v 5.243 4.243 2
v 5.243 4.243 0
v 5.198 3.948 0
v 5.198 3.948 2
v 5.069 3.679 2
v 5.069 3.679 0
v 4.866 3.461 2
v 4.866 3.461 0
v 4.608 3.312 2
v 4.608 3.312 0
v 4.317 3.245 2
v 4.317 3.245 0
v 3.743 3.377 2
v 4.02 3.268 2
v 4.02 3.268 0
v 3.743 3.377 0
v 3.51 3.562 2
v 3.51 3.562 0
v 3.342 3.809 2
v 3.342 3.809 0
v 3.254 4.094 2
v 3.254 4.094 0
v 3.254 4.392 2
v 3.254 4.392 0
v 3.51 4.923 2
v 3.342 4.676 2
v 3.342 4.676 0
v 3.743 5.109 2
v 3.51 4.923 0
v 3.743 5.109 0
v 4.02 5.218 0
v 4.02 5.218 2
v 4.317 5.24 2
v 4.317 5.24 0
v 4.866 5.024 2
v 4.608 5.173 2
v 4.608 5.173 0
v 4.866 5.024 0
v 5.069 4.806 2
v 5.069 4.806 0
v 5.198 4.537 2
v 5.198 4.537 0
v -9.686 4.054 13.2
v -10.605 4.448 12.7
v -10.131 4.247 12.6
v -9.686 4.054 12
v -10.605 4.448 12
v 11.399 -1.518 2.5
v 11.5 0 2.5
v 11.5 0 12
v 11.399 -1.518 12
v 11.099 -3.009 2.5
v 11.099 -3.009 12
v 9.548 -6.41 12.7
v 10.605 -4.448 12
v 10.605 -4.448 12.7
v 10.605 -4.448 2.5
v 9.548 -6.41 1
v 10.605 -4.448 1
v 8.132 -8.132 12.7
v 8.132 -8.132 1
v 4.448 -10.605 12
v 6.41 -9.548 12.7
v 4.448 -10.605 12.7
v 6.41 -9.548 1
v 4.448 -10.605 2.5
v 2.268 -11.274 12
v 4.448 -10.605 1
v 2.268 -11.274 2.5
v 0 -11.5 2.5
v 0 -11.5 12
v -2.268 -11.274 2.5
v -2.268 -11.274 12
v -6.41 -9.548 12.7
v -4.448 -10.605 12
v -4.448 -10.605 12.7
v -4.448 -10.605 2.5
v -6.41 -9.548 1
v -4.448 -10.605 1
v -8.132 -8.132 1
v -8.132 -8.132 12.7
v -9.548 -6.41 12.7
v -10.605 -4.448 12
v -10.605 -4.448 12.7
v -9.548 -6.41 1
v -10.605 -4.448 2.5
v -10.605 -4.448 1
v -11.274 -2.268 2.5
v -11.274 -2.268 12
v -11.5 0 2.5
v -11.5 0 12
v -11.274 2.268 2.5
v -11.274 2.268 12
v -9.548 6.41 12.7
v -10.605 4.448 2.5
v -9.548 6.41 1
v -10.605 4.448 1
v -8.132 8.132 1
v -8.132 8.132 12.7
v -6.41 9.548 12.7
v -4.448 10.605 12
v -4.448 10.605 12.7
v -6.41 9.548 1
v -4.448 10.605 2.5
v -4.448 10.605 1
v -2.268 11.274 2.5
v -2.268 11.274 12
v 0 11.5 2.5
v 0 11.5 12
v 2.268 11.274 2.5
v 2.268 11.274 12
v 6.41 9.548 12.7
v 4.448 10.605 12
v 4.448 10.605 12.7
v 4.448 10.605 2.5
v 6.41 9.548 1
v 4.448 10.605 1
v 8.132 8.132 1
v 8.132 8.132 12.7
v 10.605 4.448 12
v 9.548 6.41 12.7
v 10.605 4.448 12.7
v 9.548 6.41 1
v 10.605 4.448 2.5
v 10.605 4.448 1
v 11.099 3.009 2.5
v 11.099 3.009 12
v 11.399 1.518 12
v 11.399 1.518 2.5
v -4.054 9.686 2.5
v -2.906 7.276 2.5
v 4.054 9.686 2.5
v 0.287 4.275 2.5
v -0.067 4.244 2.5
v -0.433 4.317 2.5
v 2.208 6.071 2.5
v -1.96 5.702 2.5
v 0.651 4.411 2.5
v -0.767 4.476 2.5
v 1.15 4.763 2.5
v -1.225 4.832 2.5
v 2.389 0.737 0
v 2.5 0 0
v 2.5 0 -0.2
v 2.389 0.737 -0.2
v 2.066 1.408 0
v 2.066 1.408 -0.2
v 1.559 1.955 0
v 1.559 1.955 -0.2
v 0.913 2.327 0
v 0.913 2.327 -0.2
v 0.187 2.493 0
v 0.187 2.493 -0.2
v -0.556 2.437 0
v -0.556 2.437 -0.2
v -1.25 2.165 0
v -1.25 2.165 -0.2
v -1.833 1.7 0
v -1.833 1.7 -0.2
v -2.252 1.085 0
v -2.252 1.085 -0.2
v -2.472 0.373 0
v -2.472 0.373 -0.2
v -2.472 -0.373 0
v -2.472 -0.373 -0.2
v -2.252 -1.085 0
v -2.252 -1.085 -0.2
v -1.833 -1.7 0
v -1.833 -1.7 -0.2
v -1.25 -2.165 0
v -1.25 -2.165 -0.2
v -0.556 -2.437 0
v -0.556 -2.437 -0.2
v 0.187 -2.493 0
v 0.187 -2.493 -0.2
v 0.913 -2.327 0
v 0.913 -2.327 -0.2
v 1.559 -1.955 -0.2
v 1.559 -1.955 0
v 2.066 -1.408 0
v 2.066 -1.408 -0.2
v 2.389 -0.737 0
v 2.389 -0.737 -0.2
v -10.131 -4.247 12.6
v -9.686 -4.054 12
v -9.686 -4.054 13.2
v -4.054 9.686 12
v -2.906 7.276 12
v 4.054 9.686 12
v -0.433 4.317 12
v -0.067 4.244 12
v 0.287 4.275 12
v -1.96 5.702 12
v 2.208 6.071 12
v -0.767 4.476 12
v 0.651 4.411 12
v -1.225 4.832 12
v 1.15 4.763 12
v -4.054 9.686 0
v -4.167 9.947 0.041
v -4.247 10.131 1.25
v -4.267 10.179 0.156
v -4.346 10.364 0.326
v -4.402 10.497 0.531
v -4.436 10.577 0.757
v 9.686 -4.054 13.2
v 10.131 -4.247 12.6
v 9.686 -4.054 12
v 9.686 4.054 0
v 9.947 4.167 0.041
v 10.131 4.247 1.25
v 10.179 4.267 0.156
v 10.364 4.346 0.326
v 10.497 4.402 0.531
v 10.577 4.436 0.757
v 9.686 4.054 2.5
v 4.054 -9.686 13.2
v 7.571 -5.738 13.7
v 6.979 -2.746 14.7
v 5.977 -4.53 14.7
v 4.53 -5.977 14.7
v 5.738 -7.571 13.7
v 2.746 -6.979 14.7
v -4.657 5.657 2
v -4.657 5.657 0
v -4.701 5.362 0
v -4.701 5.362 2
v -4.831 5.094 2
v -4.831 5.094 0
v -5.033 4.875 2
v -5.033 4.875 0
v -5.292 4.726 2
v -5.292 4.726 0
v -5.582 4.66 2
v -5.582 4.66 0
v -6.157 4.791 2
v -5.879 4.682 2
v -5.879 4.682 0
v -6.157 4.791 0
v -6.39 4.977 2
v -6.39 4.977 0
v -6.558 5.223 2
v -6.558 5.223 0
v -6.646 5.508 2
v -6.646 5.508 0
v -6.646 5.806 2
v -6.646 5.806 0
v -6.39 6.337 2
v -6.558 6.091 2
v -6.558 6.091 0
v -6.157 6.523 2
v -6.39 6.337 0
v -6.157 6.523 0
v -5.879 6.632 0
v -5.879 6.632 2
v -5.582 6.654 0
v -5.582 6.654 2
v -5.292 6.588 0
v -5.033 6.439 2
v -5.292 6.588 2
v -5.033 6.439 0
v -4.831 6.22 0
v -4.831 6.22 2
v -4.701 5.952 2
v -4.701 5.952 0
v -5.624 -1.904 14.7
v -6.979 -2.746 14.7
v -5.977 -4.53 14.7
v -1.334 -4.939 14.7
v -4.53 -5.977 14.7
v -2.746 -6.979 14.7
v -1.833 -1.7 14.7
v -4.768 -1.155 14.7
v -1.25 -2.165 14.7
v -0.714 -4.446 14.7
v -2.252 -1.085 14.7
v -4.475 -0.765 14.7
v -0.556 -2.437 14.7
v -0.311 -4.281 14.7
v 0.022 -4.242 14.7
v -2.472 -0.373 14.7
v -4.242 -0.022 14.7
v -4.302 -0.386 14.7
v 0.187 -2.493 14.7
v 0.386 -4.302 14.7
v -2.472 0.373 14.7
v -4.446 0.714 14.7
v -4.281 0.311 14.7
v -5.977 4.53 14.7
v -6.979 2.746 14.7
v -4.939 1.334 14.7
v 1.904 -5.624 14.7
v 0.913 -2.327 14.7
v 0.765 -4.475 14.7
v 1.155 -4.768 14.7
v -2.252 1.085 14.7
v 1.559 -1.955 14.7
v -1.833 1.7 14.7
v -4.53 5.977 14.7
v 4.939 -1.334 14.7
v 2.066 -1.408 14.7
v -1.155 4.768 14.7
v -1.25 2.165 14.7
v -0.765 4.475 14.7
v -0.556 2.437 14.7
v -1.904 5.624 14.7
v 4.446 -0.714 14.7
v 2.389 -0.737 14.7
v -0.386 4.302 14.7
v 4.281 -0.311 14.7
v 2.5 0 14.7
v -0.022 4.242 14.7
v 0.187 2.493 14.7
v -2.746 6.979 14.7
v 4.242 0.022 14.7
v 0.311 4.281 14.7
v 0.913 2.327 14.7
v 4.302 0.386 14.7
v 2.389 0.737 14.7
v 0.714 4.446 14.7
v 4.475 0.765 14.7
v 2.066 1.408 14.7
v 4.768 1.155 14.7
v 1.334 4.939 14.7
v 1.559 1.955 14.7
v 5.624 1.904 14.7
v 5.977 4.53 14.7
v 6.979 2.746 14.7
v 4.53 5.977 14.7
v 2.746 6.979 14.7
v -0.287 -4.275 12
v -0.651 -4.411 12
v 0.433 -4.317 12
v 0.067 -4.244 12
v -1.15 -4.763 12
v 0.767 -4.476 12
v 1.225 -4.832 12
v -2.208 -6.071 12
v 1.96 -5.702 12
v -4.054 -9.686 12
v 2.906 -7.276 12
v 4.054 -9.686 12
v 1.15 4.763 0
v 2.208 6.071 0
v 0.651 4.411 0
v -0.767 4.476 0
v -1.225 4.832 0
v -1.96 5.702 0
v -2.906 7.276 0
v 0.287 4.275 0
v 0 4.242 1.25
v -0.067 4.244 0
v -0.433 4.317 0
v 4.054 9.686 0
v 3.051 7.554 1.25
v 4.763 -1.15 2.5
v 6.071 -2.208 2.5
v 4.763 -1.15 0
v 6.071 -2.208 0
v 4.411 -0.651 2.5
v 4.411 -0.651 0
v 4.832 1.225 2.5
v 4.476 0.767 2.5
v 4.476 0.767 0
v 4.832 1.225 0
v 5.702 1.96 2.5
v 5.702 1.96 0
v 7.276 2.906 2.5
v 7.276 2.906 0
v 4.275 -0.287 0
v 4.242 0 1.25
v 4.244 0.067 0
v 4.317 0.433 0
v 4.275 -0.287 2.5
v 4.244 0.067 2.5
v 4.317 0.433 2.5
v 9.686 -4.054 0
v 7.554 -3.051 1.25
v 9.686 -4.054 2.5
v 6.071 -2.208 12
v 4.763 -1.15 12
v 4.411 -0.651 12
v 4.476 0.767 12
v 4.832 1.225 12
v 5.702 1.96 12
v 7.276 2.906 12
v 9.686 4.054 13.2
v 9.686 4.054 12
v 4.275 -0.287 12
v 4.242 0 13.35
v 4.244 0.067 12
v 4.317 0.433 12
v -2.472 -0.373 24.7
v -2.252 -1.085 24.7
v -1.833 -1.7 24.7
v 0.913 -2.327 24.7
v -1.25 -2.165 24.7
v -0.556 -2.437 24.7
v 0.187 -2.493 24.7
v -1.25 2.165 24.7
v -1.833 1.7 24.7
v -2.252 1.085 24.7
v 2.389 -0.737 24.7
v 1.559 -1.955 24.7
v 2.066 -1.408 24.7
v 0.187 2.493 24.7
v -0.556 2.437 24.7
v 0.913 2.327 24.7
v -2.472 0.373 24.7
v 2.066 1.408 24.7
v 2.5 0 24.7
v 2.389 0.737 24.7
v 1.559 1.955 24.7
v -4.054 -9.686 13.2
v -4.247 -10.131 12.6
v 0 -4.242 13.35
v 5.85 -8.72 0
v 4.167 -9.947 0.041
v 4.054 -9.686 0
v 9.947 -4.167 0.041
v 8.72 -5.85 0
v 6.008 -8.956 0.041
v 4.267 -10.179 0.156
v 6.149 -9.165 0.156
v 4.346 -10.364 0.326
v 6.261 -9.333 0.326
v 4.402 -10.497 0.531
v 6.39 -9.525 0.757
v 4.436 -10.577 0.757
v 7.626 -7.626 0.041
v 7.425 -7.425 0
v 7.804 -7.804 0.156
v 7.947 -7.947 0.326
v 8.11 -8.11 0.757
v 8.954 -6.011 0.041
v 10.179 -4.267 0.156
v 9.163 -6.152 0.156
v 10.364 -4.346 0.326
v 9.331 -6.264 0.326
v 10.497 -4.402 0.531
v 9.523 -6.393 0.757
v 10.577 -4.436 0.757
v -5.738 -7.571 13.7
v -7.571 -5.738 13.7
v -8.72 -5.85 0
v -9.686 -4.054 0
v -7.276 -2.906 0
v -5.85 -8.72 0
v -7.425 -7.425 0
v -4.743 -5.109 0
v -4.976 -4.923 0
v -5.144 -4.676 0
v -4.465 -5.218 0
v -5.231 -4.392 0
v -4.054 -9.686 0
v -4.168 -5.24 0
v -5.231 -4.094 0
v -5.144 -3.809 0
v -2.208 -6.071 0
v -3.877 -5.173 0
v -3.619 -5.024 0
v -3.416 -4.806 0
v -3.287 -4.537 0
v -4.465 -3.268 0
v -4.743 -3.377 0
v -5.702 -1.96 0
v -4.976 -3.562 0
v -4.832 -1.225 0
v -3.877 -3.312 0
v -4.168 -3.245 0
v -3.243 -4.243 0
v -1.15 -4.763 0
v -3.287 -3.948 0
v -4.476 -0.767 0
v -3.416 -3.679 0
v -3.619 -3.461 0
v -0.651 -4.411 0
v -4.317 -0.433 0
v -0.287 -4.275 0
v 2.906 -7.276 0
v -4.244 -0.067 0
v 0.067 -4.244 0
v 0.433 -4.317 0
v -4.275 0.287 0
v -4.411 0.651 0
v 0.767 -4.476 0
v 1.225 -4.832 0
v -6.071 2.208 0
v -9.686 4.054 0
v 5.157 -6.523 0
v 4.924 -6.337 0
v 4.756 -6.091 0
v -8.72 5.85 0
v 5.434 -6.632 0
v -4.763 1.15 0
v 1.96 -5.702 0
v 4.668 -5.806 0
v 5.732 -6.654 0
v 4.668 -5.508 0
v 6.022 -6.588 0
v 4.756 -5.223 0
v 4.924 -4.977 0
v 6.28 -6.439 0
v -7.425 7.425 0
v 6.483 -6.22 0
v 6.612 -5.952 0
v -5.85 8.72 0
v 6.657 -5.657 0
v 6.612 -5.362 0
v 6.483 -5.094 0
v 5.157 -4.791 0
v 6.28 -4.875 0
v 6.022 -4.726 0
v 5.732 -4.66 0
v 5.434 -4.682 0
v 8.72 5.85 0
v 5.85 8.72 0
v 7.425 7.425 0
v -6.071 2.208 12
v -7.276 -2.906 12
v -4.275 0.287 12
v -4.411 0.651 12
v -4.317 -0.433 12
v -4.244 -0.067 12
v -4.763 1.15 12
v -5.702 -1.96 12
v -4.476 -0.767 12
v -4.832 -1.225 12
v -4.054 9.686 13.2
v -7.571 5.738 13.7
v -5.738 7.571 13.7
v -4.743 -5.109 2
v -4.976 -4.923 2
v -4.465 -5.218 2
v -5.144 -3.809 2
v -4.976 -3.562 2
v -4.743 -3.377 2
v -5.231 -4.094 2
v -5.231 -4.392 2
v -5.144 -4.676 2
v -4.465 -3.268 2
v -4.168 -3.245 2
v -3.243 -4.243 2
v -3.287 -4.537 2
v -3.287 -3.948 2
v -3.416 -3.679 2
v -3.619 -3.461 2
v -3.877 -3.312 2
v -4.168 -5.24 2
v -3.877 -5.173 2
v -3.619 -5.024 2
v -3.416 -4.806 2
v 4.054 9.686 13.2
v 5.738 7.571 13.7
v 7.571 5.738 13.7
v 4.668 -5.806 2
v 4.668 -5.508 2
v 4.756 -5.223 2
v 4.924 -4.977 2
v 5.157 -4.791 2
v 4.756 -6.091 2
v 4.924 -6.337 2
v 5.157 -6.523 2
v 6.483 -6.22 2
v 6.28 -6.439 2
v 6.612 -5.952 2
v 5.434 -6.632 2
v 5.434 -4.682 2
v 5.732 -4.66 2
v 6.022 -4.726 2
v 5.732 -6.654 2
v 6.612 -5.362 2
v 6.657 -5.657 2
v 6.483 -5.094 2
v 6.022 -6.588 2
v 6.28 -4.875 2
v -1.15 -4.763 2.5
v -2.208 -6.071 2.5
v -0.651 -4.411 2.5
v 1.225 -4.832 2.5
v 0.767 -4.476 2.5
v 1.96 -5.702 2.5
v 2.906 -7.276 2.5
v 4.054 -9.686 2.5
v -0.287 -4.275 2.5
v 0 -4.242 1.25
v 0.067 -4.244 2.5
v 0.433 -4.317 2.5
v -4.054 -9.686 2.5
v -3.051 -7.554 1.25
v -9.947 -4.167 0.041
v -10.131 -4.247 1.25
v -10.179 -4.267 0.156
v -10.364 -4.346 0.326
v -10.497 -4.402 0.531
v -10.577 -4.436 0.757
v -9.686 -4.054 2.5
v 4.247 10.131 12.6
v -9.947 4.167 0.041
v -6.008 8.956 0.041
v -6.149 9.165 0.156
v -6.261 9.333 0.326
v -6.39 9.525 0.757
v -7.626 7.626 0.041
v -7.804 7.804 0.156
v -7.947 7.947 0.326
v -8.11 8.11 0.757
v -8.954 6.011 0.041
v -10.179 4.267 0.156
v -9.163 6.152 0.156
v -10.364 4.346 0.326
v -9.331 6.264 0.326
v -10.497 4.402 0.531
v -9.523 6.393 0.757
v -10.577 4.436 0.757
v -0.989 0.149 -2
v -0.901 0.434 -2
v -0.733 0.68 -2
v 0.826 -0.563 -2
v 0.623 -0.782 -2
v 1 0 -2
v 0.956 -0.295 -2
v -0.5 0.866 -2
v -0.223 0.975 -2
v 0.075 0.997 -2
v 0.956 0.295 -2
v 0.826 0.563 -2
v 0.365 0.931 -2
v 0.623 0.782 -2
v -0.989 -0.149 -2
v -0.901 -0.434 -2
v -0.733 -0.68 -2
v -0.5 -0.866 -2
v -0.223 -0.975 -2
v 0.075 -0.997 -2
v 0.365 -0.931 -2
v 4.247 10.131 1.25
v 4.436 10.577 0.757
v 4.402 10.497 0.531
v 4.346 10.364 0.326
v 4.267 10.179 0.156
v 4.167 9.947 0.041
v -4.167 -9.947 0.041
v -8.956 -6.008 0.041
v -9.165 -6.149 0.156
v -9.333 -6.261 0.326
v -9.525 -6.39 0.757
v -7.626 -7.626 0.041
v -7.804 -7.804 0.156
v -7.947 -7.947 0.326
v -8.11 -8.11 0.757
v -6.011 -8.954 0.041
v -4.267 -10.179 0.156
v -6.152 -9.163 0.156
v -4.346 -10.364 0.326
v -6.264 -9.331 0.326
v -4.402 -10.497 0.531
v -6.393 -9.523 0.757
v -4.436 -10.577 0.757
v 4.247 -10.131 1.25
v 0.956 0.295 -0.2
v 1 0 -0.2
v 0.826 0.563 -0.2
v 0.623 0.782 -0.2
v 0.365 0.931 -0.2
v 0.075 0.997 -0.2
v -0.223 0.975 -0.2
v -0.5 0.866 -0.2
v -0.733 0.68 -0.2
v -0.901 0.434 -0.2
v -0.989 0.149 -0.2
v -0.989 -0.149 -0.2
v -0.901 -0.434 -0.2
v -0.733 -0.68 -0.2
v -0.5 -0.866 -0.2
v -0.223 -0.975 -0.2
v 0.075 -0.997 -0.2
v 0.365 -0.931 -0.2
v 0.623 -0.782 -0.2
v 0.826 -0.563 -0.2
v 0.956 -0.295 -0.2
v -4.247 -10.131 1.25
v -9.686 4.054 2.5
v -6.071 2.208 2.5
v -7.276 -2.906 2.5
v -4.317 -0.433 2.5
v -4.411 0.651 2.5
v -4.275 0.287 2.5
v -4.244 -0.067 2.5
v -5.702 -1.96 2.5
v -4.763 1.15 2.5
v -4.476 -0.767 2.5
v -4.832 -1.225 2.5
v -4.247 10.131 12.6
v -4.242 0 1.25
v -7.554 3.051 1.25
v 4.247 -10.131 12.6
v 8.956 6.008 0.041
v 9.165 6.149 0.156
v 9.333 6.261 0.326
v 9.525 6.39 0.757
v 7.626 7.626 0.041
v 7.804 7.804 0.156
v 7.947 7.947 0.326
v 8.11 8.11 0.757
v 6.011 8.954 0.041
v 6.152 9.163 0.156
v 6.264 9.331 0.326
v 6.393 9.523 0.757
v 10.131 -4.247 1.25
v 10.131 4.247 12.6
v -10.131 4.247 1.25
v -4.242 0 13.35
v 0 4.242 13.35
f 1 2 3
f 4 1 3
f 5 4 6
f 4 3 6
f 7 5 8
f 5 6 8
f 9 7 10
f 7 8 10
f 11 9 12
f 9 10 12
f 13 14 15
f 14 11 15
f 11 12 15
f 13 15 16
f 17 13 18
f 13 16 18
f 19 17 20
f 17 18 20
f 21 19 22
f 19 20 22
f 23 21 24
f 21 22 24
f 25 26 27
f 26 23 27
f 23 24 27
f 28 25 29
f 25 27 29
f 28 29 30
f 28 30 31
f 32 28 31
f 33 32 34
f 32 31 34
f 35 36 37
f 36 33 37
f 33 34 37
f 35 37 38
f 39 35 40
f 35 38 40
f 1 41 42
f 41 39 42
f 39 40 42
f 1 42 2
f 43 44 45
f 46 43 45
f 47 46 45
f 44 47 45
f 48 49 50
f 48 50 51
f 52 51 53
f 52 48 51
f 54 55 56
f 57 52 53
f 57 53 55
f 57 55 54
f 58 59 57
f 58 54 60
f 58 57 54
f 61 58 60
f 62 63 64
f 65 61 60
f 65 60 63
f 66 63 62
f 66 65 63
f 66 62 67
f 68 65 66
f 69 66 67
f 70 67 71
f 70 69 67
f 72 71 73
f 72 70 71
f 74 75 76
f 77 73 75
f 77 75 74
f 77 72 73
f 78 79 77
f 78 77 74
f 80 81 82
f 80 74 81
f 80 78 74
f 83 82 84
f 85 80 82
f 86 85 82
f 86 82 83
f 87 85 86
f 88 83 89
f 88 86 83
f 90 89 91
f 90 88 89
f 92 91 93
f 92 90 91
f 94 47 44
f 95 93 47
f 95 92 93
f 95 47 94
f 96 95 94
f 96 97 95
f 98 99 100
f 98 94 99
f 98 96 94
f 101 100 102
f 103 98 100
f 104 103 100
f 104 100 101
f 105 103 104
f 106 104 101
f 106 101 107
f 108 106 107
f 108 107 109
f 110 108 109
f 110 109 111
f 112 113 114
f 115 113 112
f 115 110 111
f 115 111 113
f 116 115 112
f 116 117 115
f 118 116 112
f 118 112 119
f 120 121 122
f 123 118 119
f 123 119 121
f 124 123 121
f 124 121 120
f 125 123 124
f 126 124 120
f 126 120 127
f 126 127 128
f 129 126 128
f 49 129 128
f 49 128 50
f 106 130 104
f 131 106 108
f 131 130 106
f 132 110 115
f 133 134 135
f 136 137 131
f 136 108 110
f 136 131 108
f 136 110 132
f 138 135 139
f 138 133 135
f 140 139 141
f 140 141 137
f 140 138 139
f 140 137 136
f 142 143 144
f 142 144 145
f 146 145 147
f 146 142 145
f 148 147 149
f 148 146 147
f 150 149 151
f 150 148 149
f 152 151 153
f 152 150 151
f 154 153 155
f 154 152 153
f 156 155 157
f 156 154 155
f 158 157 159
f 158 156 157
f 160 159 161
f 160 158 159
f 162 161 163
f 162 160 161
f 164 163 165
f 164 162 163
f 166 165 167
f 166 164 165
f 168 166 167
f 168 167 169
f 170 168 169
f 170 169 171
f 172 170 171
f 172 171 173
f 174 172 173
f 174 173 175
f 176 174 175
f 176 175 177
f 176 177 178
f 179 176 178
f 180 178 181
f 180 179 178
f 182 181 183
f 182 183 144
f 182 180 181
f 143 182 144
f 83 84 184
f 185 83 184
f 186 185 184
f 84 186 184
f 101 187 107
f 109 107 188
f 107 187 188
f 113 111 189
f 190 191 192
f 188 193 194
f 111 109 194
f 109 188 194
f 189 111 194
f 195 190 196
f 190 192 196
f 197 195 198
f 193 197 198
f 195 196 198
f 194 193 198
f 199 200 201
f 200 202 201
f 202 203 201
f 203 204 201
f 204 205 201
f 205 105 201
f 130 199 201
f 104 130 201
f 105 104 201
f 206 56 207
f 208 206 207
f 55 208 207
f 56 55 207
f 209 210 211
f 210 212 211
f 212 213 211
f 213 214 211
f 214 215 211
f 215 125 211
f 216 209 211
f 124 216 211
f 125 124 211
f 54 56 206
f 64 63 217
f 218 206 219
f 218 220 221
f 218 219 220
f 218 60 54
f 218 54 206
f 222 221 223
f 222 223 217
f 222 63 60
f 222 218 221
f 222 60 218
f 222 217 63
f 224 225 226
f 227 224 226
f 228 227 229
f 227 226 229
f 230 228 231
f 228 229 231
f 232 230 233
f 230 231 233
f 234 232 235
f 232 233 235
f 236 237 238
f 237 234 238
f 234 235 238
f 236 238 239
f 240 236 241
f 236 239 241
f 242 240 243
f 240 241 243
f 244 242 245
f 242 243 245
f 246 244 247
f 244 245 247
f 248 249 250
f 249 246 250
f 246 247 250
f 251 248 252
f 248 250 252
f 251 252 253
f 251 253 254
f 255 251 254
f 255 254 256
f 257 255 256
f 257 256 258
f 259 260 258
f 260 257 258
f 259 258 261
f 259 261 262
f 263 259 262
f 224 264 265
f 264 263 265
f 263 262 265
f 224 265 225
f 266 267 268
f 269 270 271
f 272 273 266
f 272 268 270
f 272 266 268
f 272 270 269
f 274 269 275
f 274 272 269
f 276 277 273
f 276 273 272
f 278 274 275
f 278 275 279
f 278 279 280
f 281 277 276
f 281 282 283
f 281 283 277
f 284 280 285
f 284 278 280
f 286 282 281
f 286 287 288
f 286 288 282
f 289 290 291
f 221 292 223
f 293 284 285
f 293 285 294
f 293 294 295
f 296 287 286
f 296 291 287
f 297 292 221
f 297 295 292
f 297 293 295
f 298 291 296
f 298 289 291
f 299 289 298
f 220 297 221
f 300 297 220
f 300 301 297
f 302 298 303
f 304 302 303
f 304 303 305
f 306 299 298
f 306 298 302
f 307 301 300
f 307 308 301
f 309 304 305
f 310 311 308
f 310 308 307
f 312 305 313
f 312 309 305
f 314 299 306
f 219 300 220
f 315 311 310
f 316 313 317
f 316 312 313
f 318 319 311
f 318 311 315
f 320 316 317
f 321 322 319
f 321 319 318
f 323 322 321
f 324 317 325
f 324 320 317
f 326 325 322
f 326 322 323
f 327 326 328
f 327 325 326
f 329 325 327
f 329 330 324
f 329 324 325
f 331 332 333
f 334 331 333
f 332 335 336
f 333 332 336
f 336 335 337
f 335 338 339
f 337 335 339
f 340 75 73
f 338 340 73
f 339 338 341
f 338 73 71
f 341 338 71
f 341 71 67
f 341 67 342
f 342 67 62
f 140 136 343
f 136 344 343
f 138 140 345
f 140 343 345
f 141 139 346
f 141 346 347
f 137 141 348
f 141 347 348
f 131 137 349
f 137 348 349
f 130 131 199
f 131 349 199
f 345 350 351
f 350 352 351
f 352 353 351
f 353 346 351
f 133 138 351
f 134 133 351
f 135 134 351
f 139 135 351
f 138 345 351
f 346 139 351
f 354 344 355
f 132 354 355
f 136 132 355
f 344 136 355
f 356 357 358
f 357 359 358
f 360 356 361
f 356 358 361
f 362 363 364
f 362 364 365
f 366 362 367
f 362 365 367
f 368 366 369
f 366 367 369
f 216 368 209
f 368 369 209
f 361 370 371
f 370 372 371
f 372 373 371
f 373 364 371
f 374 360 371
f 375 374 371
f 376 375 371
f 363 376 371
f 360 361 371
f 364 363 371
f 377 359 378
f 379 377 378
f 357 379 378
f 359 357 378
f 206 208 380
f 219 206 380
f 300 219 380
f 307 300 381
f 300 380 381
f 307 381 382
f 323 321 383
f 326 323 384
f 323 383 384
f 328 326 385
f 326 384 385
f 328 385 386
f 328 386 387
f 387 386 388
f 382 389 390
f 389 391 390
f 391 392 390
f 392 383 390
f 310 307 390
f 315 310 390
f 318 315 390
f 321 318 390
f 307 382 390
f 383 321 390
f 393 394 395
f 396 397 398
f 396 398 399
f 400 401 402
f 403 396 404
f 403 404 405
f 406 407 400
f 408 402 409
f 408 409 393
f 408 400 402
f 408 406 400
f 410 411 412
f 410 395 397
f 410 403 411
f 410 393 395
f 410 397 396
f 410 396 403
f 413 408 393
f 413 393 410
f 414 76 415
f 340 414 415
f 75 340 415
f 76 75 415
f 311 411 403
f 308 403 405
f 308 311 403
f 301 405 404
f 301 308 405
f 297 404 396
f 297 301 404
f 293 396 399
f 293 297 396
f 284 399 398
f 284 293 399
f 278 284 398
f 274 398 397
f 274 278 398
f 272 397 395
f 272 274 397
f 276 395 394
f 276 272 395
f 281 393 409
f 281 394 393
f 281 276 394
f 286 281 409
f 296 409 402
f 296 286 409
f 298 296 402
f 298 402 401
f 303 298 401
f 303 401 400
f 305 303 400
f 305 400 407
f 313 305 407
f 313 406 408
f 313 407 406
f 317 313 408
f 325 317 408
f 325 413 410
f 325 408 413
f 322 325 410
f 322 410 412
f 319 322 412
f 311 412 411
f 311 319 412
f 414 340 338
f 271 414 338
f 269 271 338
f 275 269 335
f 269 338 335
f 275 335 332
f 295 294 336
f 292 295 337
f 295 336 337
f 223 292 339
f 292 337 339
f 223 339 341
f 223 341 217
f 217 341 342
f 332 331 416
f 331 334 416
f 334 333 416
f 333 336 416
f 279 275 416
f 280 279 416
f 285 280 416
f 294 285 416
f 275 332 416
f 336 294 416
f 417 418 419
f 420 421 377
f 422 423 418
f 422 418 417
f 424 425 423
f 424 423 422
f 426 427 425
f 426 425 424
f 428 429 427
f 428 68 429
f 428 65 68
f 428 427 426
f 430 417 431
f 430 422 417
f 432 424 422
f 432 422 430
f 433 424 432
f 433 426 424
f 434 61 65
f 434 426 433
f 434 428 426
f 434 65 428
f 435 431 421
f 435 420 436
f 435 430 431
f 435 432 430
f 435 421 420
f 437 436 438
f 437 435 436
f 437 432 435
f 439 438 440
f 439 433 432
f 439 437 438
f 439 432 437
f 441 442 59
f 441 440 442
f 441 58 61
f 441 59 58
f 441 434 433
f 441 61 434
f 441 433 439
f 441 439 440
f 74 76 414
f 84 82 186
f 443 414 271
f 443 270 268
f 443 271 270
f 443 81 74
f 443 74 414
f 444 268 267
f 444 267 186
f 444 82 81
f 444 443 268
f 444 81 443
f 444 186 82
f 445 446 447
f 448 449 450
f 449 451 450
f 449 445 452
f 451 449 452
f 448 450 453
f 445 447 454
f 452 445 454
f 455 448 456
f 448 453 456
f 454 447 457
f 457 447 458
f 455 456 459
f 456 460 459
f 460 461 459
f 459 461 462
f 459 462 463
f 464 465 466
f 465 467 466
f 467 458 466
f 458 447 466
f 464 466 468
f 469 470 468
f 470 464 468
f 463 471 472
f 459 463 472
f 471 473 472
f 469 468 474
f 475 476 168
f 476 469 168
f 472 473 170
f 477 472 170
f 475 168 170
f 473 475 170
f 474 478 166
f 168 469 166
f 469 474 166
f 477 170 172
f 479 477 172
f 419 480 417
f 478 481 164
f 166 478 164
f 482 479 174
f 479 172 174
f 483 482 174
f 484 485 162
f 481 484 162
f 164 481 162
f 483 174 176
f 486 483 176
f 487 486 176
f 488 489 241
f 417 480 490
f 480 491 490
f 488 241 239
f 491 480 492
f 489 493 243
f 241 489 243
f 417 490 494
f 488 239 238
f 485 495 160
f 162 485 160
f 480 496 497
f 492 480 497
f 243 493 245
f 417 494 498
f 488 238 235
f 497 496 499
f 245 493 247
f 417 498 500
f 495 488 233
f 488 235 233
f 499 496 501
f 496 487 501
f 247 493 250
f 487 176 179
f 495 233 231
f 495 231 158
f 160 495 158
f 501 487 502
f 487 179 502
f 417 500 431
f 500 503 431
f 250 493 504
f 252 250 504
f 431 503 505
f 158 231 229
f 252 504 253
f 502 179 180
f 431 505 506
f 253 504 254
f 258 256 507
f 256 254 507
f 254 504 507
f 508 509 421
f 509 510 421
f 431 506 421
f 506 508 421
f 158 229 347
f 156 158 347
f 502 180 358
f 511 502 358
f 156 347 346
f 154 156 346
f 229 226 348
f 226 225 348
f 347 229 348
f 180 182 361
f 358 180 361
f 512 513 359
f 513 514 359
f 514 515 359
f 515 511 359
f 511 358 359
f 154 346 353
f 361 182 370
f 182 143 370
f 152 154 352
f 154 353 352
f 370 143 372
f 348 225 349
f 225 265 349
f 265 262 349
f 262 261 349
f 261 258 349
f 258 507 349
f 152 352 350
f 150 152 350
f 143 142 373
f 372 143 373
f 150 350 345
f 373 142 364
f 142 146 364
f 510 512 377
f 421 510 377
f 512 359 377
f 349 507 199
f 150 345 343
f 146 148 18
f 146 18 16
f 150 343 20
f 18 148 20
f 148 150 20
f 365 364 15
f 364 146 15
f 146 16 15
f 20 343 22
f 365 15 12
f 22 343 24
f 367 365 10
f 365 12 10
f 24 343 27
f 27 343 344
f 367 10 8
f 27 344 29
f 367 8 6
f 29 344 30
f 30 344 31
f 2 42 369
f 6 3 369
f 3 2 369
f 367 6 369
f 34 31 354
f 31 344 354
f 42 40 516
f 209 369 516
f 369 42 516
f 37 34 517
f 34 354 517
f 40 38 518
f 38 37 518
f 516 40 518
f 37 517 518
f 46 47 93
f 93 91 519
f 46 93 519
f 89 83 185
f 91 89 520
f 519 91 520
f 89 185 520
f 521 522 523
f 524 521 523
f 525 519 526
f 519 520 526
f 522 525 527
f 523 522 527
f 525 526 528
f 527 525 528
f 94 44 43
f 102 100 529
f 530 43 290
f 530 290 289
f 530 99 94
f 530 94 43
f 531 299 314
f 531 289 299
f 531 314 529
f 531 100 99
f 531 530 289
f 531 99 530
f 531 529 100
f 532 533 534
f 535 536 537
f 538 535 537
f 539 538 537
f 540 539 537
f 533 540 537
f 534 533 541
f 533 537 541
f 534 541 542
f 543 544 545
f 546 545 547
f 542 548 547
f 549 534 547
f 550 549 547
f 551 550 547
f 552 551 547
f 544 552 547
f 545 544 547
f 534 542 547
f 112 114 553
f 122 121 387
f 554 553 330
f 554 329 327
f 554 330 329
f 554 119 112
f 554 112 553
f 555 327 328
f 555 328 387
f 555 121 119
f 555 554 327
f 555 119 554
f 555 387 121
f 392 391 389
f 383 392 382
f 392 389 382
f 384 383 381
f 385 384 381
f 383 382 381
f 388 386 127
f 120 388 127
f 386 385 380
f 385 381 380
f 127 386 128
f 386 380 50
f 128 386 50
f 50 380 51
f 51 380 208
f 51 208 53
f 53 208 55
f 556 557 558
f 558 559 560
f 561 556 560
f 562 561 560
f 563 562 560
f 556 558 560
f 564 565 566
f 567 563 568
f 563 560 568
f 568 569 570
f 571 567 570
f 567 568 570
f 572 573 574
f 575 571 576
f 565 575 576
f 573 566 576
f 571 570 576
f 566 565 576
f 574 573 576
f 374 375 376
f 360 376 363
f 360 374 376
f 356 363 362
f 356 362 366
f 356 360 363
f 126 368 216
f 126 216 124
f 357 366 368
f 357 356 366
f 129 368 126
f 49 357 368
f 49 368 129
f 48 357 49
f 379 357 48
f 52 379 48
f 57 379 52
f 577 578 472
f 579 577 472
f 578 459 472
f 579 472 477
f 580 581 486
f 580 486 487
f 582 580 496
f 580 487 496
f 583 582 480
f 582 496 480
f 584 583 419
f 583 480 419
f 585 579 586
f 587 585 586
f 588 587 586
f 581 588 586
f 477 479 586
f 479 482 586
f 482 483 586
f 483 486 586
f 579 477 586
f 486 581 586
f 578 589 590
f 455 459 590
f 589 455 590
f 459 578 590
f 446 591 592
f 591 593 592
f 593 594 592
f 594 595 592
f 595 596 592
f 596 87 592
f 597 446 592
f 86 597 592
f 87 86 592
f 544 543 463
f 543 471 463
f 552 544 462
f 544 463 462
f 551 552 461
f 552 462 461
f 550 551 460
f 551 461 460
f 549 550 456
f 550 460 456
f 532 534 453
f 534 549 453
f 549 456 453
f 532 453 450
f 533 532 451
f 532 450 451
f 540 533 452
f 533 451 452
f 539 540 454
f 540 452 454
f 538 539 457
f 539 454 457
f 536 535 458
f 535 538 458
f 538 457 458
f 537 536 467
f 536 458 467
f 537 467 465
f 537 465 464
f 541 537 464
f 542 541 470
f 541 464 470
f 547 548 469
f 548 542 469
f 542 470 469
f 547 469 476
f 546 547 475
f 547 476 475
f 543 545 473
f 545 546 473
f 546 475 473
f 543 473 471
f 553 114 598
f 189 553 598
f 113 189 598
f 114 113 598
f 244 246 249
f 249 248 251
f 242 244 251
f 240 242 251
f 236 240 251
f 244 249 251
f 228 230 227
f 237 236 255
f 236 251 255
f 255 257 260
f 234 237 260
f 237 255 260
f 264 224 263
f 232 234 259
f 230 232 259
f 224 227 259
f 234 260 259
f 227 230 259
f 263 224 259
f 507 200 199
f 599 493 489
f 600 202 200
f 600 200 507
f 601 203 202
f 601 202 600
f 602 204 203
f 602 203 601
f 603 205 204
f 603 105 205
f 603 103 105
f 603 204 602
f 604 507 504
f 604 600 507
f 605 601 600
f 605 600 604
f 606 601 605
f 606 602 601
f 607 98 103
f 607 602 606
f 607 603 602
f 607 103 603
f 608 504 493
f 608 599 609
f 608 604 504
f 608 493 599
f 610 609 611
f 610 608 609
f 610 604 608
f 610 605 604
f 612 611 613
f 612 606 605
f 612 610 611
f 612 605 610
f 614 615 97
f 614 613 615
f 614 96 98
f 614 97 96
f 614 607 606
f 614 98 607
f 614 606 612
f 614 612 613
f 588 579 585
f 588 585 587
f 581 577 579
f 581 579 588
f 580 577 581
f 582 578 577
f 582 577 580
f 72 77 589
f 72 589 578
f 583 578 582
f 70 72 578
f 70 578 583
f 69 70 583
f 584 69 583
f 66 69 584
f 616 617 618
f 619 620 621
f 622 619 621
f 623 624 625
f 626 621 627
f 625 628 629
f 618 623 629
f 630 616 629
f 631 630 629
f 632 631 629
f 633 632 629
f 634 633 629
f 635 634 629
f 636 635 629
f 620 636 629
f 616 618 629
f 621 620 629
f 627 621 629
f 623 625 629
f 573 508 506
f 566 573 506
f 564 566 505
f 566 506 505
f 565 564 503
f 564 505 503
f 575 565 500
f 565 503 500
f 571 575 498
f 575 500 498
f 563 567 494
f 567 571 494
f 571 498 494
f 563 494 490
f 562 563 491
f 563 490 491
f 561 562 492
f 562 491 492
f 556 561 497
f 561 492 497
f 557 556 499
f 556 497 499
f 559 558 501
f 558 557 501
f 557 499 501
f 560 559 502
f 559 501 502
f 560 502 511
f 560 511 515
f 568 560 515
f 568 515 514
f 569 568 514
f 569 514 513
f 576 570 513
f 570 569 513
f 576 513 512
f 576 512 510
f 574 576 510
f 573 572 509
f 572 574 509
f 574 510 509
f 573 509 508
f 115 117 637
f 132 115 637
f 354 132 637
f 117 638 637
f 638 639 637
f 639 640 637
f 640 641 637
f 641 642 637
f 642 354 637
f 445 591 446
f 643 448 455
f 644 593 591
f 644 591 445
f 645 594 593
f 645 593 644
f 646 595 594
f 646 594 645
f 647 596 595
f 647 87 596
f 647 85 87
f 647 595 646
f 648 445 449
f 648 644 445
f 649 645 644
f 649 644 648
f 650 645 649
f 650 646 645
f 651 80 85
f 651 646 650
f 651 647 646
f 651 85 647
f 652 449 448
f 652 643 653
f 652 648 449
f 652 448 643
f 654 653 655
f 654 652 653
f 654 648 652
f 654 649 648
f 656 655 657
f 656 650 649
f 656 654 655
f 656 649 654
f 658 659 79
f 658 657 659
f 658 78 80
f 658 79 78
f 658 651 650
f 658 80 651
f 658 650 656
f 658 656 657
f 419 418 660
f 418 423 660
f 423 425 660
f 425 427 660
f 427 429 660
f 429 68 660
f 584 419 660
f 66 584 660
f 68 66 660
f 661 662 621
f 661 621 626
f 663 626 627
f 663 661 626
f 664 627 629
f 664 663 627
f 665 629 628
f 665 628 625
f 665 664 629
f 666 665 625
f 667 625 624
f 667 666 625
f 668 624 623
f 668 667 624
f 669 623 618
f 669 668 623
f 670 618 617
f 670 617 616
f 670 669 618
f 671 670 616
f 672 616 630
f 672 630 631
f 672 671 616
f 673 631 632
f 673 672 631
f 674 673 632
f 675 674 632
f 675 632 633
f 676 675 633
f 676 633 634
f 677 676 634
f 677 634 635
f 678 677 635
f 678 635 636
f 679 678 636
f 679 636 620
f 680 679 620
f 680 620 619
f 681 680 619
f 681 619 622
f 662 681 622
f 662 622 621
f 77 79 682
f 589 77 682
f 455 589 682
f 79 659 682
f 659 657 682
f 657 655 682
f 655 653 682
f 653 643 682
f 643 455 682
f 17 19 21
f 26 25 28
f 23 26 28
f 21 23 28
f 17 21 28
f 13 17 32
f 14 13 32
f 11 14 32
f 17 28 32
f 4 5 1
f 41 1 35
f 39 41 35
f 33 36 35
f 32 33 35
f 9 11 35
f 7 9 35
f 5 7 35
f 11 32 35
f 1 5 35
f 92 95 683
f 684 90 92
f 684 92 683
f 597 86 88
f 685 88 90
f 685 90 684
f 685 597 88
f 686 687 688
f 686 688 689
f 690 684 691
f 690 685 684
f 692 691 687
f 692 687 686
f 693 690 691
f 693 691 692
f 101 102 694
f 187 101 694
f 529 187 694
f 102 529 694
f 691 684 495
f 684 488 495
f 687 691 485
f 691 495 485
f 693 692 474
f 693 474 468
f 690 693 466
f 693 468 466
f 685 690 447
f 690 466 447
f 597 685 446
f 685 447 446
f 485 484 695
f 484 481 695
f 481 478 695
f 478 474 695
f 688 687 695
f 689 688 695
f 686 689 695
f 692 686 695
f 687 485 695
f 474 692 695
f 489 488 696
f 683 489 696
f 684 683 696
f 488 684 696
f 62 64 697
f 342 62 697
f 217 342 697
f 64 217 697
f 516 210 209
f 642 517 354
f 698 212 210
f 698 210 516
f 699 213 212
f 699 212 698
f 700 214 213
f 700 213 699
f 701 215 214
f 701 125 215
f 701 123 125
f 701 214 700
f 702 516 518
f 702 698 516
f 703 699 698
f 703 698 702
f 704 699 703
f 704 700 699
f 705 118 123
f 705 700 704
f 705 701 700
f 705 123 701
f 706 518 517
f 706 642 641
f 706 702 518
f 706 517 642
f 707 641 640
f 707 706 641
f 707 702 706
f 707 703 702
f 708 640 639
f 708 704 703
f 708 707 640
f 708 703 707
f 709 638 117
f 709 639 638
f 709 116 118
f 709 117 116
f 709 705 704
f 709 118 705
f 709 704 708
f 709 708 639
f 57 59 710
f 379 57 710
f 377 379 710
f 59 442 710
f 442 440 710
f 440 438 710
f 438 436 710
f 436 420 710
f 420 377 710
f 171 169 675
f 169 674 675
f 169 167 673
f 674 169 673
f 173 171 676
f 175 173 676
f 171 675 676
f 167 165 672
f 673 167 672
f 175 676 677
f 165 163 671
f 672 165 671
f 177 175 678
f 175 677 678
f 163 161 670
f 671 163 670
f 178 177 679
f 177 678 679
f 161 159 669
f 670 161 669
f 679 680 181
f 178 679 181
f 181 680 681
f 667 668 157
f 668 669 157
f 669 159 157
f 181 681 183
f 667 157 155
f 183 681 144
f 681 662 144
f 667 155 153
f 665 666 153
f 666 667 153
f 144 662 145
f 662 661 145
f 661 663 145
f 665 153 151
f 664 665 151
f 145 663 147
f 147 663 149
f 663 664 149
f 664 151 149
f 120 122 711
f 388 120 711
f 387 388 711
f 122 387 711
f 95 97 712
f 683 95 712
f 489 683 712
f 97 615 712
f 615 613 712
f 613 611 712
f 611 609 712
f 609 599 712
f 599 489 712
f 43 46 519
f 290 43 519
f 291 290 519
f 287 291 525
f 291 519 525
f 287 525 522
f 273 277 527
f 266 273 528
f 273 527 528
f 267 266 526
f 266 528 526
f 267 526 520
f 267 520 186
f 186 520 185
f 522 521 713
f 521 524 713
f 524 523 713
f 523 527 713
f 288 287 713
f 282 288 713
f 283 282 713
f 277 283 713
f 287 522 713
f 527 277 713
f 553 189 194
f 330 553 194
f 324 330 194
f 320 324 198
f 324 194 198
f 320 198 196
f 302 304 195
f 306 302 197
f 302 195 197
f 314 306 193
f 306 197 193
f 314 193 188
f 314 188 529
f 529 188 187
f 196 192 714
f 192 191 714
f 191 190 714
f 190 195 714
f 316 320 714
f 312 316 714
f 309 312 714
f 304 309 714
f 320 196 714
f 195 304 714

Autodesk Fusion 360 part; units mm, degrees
sketch "Sketch1" plane through (0, 0, 0) normal (0, 0, 1) x (1, 0, 0)
  circle A0 centre (0, 0) radius 2.5
  circle A1 centre (0, 0) radius 11.5
  line L0 (-5.6569, 5.6569) -> (5.6569, -5.6569) construction
  line L1 (4.2426, 4.2426) -> (-4.2426, -4.2426) construction
  circle A2 centre (-5.6569, 5.6569) radius 1
  circle A3 centre (4.2426, 4.2426) radius 1
  circle A4 centre (5.6569, -5.6569) radius 1
  circle A5 centre (-4.2426, -4.2426) radius 1
  line L2 (0, 0) -> (4, 0) construction
  circle A6 centre (0, 0) radius 1
  dimension "d1" = 5
  dimension "d2" = 23
  dimension "d3" = 12
  dimension "d4" = 16
  dimension "d5" = 2
  dimension "d6" = 45
  dimension "d7" = 2
extrude "Extrude1" add sketch "Sketch1" against normal blind 2 contours A6
extrude "Extrude2" add sketch "Sketch1" along normal blind 14.7 contours A0 | A1 | A2 | A3 | A4 | A5 | A6
extrude "Extrude3" add sketch "Sketch1" against normal blind 0.2 contours A0
extrude "Extrude4" cut sketch "Sketch1" along normal blind 2 contours A2 | A3 | A4 | A5
extrude "Extrude5" add sketch "Sketch1" along normal blind 24.7 contours A0 | A6
fillet "Fillet1" radius 1 1 edges at (-10.7218, -4.1586, 0)
chamfer "Chamfer1" distance 4 distance2 2 1 edges at (-10.7218, -4.1586, 14.7) measured on face at (8.4479, -0.6955, 14.7)
sketch "Sketch2" plane through (0, 0, 0) normal (0, 0, -1) x (1, 0, 0)
  circle A0 centre (0, 0) radius 2.5
  circle A1 centre (4.2426, -4.2426) radius 1
  circle A2 centre (-5.6569, -5.6569) radius 1
  circle A3 centre (5.6569, 5.6569) radius 1
  circle A4 centre (-4.2426, 4.2426) radius 1
  circle A5 centre (0, 0) radius 10.5
  spline S0 degree 2 poles (-4.4476, 10.6051) (0, 0) (4.4476, 10.6051) knots 0 0 0 1.552673 1.552673 1.552673 weights 1 1.5 1
  spline S1 degree 2 poles (-10.6051, -4.4476) (0, 0) (-10.6051, 4.4476) knots 0 0 0 1.552673 1.552673 1.552673 weights 1 1.5 1
  spline S2 degree 2 poles (4.4476, -10.6051) (0, 0) (-4.4476, -10.6051) knots 0 0 0 1.552673 1.552673 1.552673 weights 1 1.5 1
  spline S3 degree 2 poles (10.6051, 4.4476) (0, 0) (10.6051, -4.4476) knots 0 0 0 1.552673 1.552673 1.552673 weights 1 1.5 1
  circle A6 centre (0, 0) radius 11.5
  line L0 (-4.4476, 10.6051) -> (4.4476, 10.6051) construction
  dimension "d24" = 360
extrude "Extrude6" cut sketch "Sketch2" against normal blind 2.5 contours A5 S3 | A5 S3 A6 | A5 S0 | A5 S0 A6 | A5 S2 A6 | A5 S2 | A5 S1 | A5 S1 A6
extrude "Extrude7" cut sketch "Sketch2" along normal blind -14.7 and the other way blind 12 contours A5 S3 | A5 S3 A6 | A5 S0 | A5 S0 A6 | A5 S2 A6 | A5 S2 | A5 S1 | A5 S1 A6
